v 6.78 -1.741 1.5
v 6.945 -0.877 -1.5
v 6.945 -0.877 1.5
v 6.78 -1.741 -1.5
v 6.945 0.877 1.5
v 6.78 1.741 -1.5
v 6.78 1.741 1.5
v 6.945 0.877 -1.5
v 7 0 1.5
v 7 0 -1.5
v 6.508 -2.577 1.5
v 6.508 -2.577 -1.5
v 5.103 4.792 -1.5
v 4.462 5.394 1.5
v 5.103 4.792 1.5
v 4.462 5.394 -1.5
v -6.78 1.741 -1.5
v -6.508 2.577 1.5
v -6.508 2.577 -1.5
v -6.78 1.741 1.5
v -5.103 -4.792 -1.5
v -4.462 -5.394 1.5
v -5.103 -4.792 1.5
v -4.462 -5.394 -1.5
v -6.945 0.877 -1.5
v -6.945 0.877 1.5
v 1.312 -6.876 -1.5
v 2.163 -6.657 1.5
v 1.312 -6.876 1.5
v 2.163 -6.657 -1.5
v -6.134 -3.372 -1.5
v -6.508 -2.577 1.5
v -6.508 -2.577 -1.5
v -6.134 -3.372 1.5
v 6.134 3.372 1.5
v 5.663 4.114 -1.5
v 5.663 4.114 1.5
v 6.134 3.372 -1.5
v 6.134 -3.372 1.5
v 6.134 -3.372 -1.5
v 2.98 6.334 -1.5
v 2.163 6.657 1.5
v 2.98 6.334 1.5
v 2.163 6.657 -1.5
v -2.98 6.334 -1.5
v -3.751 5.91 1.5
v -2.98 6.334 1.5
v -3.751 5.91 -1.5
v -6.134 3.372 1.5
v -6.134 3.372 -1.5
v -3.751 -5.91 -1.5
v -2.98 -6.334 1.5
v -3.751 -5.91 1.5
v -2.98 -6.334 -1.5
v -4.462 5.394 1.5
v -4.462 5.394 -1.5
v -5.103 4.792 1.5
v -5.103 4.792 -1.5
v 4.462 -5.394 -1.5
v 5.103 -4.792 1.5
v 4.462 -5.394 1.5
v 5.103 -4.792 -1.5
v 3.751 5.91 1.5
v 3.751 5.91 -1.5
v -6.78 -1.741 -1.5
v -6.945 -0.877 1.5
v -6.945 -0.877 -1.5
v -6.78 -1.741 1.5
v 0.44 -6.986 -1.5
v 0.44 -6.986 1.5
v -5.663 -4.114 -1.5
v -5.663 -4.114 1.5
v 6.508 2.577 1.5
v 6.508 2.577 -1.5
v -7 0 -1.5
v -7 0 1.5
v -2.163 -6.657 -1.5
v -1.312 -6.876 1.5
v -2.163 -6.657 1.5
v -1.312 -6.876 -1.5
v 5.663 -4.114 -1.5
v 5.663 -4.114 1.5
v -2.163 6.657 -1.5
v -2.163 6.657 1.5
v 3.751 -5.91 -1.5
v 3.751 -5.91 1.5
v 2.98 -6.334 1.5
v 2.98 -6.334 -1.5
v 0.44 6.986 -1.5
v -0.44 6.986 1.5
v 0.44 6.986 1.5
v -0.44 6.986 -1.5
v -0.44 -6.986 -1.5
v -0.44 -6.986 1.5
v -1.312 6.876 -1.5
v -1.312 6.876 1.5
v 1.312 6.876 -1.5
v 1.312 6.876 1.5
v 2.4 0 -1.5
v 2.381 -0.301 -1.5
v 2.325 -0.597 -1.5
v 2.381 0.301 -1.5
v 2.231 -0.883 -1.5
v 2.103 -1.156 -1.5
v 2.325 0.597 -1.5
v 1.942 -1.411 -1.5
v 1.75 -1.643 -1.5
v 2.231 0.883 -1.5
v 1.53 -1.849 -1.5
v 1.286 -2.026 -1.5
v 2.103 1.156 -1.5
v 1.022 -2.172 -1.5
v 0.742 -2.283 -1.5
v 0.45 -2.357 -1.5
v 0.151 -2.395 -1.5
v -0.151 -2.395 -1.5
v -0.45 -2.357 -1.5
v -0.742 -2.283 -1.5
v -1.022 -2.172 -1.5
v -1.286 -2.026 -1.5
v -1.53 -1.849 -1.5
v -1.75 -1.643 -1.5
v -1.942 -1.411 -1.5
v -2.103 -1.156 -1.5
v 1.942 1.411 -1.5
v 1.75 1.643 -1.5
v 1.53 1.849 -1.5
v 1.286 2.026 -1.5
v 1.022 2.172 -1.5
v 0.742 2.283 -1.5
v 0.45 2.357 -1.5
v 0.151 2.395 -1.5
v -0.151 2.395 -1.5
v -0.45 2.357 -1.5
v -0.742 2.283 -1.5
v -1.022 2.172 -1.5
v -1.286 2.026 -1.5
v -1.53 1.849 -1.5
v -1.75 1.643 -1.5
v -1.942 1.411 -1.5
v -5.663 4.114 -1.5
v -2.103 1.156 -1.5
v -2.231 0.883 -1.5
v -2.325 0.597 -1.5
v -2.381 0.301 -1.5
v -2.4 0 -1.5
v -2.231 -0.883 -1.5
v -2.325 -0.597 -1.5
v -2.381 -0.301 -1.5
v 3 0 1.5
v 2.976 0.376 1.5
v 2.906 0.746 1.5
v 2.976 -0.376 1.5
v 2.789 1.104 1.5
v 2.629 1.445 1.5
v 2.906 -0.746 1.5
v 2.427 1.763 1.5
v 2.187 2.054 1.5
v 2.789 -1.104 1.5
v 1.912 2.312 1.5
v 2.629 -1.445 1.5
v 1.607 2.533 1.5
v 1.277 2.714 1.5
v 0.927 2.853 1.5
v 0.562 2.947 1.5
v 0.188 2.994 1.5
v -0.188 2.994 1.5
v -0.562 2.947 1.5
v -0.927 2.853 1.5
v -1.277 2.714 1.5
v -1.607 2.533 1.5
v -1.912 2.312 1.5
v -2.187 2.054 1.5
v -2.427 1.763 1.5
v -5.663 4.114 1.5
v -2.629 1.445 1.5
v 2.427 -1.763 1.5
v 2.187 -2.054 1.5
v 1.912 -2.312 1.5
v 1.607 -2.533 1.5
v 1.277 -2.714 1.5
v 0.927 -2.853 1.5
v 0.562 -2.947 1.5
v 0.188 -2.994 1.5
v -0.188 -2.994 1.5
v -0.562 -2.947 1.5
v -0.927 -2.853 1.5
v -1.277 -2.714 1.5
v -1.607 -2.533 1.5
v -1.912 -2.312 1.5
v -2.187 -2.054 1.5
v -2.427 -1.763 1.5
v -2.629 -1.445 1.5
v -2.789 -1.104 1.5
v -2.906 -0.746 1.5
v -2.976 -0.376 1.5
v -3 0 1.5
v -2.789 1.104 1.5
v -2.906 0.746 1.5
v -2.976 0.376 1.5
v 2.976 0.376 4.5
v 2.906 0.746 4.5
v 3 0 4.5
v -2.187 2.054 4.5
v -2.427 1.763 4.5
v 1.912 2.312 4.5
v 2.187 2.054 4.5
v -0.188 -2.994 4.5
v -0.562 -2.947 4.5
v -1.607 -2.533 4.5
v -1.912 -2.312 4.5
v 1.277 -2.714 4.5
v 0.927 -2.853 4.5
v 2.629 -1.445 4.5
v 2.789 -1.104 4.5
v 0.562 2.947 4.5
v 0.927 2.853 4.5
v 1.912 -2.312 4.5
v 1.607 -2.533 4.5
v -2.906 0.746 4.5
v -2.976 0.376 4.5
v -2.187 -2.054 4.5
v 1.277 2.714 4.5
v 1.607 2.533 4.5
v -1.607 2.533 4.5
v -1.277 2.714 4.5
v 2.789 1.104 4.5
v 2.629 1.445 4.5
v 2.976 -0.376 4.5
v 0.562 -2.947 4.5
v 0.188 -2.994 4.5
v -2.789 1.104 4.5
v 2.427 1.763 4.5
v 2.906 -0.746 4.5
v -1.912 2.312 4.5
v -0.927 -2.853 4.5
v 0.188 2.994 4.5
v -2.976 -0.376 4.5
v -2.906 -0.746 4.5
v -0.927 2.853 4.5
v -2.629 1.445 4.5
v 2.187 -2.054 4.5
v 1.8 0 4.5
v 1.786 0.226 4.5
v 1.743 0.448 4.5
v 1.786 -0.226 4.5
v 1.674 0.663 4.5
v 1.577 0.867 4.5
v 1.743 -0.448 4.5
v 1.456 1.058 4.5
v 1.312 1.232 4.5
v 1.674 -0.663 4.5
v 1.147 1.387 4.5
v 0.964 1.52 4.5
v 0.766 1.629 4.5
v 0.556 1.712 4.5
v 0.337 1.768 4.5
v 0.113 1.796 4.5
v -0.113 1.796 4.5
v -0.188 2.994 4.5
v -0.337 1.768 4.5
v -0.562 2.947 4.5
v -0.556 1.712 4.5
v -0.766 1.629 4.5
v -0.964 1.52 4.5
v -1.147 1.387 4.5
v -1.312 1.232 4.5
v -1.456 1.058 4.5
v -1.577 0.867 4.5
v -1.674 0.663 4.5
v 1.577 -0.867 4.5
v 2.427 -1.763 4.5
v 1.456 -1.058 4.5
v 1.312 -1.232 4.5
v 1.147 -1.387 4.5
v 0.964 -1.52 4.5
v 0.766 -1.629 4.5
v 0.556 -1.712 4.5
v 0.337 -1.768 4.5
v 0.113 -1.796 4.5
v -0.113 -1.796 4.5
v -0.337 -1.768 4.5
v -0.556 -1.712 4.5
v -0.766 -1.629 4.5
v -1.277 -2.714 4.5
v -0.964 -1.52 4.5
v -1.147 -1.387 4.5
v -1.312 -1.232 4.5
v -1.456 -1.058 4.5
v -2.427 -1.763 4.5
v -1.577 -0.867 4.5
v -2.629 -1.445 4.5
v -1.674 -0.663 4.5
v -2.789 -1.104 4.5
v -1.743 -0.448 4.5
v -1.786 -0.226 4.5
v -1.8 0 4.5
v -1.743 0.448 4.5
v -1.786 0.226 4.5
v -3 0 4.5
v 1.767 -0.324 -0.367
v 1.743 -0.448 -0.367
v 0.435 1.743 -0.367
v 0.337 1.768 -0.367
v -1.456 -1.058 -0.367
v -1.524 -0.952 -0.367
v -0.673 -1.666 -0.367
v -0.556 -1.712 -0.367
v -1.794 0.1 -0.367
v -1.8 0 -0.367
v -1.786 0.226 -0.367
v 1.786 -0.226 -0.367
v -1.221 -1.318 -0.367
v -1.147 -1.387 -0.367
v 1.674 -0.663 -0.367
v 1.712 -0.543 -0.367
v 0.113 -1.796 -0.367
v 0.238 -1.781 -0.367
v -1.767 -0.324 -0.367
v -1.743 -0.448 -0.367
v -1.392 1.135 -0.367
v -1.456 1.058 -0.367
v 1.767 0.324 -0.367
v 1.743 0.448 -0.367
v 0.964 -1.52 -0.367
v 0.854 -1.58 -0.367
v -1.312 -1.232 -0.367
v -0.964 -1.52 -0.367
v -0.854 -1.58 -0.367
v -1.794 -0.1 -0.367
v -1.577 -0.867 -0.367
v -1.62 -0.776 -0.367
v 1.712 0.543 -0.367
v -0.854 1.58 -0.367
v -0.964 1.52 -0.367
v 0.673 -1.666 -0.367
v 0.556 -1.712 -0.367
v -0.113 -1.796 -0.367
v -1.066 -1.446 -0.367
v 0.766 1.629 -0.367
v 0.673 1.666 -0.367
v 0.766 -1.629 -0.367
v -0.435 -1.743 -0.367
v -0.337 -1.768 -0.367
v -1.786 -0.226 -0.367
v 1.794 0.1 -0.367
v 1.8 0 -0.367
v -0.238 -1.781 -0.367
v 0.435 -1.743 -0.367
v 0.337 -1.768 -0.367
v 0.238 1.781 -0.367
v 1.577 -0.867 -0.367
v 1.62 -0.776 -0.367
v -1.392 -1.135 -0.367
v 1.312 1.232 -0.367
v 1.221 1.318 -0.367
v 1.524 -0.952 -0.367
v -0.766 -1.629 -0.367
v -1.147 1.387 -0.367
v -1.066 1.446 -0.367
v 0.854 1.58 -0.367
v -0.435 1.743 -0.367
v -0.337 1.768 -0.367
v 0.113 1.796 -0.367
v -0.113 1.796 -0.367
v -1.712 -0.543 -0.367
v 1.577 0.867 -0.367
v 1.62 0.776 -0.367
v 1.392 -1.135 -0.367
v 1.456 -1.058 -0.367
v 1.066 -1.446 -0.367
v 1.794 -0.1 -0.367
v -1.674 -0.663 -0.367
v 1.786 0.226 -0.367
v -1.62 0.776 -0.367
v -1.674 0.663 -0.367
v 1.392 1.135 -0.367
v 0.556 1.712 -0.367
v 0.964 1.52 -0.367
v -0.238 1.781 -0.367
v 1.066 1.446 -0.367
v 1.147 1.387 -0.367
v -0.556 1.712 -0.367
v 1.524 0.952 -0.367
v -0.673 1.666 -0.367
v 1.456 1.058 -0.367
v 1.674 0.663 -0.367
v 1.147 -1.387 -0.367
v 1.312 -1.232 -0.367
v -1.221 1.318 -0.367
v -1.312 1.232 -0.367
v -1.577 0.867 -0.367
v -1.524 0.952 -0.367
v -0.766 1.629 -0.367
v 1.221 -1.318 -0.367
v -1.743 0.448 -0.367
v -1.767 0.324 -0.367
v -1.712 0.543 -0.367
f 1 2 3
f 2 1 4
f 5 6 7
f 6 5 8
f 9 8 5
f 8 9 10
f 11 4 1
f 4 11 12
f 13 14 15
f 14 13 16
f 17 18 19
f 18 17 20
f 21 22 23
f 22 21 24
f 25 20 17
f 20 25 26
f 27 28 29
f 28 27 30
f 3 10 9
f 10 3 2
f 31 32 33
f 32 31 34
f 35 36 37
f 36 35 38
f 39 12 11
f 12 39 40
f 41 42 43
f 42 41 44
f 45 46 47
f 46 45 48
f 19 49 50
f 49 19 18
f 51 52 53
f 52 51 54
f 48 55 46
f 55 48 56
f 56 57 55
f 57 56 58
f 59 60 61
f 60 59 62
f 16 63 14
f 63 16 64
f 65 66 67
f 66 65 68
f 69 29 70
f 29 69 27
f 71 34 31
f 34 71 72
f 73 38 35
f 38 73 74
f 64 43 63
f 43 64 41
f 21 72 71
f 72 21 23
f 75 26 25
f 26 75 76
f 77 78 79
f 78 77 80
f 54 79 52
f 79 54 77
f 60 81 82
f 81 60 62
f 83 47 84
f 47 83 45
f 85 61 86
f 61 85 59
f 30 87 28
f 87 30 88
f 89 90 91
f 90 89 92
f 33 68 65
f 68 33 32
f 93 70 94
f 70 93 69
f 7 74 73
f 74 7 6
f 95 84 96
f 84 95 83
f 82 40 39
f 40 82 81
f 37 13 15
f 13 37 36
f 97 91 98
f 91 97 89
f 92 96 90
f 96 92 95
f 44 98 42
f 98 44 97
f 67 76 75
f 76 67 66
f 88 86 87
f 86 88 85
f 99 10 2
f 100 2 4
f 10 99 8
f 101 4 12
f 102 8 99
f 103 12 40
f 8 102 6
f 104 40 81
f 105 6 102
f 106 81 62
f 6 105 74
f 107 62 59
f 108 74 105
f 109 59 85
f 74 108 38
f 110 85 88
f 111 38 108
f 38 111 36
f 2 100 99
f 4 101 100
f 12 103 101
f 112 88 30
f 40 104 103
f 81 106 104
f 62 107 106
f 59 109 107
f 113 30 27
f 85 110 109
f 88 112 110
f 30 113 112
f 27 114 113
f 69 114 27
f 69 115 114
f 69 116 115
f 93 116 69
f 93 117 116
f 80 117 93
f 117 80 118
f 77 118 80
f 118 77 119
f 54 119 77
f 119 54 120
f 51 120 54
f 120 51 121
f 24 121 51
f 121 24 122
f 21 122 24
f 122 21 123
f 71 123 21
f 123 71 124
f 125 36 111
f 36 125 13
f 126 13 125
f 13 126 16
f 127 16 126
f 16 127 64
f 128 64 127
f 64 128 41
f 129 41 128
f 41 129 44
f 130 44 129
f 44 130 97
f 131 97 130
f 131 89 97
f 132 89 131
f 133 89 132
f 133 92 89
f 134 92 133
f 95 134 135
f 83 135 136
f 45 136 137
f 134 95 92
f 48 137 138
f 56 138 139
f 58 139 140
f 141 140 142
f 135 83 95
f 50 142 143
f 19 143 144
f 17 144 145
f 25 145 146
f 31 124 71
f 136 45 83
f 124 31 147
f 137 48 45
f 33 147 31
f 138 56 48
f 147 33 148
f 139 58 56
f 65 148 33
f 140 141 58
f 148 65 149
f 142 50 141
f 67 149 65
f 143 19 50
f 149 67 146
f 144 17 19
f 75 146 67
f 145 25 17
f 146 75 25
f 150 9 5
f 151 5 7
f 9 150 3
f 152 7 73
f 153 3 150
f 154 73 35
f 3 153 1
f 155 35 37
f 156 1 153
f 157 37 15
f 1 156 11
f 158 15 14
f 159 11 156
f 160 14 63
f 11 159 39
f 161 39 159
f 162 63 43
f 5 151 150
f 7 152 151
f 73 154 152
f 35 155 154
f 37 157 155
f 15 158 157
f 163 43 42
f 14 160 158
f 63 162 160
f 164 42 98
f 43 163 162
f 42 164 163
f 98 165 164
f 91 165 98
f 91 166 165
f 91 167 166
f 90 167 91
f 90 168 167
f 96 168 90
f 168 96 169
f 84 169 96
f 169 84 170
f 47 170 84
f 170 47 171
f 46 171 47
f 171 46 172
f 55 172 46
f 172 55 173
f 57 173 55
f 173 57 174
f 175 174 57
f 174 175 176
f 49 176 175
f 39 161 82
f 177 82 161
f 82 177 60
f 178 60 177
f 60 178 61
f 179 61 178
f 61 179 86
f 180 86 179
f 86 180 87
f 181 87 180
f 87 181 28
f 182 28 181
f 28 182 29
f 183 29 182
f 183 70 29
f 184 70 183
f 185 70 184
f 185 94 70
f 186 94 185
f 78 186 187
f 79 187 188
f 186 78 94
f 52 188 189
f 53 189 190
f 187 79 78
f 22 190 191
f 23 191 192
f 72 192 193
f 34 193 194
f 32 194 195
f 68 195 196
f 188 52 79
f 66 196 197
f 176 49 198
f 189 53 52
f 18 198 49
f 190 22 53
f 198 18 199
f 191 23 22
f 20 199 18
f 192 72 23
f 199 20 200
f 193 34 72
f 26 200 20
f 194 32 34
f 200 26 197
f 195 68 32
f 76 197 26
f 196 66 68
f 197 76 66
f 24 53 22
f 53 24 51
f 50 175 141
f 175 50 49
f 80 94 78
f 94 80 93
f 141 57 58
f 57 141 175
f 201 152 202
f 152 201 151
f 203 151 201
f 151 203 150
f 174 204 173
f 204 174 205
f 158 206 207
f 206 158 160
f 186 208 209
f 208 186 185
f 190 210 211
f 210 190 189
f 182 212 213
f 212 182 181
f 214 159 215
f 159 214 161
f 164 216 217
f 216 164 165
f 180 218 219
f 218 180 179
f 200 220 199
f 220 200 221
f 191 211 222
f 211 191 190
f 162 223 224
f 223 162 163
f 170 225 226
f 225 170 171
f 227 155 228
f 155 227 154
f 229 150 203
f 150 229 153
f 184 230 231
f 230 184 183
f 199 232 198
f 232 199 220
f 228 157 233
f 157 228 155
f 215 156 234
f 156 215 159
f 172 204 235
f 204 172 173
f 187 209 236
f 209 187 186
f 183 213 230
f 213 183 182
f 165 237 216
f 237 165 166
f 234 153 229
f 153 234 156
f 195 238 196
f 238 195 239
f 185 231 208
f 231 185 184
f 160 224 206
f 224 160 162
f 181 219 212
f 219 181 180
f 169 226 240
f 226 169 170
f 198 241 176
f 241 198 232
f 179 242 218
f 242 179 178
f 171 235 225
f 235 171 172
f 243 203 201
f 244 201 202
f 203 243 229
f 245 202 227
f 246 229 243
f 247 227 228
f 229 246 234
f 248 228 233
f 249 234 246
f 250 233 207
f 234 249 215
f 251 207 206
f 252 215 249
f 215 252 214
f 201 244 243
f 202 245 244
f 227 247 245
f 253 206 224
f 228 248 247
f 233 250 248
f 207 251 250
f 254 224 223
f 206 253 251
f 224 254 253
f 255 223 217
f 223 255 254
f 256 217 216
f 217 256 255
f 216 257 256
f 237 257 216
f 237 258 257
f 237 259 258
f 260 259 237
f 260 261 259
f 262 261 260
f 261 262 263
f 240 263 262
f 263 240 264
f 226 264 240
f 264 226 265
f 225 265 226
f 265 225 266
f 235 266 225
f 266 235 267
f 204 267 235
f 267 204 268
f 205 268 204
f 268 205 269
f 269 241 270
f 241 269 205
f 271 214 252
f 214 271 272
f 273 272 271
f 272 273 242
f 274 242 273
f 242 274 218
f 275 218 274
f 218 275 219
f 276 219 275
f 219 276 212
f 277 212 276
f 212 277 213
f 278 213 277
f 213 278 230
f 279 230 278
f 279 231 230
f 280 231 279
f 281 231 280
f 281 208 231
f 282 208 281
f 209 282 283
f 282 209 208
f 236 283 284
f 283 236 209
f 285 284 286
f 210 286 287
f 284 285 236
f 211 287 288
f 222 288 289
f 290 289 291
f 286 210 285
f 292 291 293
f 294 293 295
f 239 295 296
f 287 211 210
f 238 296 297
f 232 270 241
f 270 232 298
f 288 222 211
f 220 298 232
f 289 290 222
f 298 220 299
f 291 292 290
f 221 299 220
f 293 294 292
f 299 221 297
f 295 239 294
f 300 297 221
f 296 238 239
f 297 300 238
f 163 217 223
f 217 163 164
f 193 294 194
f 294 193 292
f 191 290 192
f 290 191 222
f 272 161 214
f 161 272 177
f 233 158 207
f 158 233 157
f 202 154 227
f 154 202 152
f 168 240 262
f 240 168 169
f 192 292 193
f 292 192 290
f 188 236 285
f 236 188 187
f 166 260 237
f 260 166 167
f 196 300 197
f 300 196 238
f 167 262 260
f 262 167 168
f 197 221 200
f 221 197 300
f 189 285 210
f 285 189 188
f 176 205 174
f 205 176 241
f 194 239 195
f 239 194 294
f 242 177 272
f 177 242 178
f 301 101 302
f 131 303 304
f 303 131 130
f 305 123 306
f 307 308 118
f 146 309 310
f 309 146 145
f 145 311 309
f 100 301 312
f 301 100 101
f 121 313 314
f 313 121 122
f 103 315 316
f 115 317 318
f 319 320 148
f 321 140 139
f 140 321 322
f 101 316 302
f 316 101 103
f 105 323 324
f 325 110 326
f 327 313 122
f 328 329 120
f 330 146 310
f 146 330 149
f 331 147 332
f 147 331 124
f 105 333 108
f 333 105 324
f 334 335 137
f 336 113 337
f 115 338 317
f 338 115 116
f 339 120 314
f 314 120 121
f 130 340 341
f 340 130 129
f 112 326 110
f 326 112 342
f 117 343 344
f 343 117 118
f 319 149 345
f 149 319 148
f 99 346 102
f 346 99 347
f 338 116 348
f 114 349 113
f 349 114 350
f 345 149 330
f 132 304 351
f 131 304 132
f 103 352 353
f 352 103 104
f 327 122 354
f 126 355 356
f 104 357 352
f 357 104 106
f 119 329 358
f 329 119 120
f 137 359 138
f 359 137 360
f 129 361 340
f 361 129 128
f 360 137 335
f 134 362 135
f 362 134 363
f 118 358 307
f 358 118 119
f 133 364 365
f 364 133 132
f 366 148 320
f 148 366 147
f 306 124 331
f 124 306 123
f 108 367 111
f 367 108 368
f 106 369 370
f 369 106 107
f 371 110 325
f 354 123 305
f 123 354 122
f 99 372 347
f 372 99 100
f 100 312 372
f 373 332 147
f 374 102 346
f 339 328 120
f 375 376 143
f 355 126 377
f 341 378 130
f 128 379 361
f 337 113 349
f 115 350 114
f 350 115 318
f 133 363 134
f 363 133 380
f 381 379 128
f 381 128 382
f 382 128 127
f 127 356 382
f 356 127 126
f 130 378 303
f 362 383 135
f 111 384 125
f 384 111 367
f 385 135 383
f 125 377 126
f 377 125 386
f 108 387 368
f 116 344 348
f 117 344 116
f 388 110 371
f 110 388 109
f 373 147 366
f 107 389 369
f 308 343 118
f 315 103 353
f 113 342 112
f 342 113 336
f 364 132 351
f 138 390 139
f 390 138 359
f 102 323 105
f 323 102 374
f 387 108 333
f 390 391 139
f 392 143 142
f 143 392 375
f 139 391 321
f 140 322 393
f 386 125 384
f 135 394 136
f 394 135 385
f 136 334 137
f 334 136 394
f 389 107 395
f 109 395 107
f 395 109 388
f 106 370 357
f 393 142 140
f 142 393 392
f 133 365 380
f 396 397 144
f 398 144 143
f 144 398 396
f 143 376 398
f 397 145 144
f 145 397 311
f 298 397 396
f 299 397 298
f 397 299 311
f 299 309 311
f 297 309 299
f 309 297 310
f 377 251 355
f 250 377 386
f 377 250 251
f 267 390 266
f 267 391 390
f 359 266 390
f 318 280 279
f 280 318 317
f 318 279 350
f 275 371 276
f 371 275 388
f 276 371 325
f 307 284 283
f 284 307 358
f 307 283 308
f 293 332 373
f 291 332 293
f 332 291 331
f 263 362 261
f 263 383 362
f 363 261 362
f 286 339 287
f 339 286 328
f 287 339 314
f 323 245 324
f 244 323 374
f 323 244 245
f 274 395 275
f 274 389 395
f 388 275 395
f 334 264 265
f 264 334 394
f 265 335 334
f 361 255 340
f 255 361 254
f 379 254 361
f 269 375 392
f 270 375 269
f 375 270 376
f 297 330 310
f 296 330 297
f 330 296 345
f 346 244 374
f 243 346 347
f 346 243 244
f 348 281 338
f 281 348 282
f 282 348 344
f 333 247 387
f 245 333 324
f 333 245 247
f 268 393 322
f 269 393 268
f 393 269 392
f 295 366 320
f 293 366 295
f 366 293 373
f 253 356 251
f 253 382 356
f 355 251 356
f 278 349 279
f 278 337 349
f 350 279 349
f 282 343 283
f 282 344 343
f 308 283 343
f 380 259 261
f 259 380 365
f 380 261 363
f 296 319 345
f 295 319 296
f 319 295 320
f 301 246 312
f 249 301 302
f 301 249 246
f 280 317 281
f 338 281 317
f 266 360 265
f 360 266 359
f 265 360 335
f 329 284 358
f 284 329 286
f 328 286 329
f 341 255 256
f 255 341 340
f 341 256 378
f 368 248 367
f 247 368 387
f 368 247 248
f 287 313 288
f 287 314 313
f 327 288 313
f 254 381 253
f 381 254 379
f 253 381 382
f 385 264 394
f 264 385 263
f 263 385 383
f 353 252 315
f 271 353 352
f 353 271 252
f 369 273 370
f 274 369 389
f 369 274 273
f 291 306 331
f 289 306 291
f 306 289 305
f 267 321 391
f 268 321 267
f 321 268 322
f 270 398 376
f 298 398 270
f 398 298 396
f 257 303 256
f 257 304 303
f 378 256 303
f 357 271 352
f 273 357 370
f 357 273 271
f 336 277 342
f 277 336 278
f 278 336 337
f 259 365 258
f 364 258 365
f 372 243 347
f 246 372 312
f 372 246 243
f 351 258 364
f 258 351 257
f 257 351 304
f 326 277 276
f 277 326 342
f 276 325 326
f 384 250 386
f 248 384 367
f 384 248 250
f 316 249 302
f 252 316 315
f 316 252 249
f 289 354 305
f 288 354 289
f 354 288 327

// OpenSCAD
$fn = 50;


difference() {
	union() {
		translate(v = [0, 0, -1.5000000000]) {
			cylinder(h = 3, r = 7.0000000000);
		}
		translate(v = [0, 0, -1.5000000000]) {
			cylinder(h = 6, r = 3.0000000000);
		}
	}
	union() {
		translate(v = [0, 0, -1.5000000000]) {
			rotate(a = [0, 180, 0]) {
				difference() {
					union() {
						translate(v = [0, 0, -1.7000000000]) {
							cylinder(h = 1.7000000000, r1 = 1.5000000000, r2 = 2.4000000000);
						}
						translate(v = [0, 0, -6.0000000000]) {
							cylinder(h = 6, r = 1.5000000000);
						}
						translate(v = [0, 0, -6.0000000000]) {
							cylinder(h = 6, r = 1.8000000000);
						}
						translate(v = [0, 0, -6.0000000000]) {
							cylinder(h = 6, r = 1.5000000000);
						}
					}
					union();
				}
			}
		}
		translate(v = [0, 0, -100.0000000000]) {
			cylinder(h = 200, r = 1.5000000000);
		}
	}
}
